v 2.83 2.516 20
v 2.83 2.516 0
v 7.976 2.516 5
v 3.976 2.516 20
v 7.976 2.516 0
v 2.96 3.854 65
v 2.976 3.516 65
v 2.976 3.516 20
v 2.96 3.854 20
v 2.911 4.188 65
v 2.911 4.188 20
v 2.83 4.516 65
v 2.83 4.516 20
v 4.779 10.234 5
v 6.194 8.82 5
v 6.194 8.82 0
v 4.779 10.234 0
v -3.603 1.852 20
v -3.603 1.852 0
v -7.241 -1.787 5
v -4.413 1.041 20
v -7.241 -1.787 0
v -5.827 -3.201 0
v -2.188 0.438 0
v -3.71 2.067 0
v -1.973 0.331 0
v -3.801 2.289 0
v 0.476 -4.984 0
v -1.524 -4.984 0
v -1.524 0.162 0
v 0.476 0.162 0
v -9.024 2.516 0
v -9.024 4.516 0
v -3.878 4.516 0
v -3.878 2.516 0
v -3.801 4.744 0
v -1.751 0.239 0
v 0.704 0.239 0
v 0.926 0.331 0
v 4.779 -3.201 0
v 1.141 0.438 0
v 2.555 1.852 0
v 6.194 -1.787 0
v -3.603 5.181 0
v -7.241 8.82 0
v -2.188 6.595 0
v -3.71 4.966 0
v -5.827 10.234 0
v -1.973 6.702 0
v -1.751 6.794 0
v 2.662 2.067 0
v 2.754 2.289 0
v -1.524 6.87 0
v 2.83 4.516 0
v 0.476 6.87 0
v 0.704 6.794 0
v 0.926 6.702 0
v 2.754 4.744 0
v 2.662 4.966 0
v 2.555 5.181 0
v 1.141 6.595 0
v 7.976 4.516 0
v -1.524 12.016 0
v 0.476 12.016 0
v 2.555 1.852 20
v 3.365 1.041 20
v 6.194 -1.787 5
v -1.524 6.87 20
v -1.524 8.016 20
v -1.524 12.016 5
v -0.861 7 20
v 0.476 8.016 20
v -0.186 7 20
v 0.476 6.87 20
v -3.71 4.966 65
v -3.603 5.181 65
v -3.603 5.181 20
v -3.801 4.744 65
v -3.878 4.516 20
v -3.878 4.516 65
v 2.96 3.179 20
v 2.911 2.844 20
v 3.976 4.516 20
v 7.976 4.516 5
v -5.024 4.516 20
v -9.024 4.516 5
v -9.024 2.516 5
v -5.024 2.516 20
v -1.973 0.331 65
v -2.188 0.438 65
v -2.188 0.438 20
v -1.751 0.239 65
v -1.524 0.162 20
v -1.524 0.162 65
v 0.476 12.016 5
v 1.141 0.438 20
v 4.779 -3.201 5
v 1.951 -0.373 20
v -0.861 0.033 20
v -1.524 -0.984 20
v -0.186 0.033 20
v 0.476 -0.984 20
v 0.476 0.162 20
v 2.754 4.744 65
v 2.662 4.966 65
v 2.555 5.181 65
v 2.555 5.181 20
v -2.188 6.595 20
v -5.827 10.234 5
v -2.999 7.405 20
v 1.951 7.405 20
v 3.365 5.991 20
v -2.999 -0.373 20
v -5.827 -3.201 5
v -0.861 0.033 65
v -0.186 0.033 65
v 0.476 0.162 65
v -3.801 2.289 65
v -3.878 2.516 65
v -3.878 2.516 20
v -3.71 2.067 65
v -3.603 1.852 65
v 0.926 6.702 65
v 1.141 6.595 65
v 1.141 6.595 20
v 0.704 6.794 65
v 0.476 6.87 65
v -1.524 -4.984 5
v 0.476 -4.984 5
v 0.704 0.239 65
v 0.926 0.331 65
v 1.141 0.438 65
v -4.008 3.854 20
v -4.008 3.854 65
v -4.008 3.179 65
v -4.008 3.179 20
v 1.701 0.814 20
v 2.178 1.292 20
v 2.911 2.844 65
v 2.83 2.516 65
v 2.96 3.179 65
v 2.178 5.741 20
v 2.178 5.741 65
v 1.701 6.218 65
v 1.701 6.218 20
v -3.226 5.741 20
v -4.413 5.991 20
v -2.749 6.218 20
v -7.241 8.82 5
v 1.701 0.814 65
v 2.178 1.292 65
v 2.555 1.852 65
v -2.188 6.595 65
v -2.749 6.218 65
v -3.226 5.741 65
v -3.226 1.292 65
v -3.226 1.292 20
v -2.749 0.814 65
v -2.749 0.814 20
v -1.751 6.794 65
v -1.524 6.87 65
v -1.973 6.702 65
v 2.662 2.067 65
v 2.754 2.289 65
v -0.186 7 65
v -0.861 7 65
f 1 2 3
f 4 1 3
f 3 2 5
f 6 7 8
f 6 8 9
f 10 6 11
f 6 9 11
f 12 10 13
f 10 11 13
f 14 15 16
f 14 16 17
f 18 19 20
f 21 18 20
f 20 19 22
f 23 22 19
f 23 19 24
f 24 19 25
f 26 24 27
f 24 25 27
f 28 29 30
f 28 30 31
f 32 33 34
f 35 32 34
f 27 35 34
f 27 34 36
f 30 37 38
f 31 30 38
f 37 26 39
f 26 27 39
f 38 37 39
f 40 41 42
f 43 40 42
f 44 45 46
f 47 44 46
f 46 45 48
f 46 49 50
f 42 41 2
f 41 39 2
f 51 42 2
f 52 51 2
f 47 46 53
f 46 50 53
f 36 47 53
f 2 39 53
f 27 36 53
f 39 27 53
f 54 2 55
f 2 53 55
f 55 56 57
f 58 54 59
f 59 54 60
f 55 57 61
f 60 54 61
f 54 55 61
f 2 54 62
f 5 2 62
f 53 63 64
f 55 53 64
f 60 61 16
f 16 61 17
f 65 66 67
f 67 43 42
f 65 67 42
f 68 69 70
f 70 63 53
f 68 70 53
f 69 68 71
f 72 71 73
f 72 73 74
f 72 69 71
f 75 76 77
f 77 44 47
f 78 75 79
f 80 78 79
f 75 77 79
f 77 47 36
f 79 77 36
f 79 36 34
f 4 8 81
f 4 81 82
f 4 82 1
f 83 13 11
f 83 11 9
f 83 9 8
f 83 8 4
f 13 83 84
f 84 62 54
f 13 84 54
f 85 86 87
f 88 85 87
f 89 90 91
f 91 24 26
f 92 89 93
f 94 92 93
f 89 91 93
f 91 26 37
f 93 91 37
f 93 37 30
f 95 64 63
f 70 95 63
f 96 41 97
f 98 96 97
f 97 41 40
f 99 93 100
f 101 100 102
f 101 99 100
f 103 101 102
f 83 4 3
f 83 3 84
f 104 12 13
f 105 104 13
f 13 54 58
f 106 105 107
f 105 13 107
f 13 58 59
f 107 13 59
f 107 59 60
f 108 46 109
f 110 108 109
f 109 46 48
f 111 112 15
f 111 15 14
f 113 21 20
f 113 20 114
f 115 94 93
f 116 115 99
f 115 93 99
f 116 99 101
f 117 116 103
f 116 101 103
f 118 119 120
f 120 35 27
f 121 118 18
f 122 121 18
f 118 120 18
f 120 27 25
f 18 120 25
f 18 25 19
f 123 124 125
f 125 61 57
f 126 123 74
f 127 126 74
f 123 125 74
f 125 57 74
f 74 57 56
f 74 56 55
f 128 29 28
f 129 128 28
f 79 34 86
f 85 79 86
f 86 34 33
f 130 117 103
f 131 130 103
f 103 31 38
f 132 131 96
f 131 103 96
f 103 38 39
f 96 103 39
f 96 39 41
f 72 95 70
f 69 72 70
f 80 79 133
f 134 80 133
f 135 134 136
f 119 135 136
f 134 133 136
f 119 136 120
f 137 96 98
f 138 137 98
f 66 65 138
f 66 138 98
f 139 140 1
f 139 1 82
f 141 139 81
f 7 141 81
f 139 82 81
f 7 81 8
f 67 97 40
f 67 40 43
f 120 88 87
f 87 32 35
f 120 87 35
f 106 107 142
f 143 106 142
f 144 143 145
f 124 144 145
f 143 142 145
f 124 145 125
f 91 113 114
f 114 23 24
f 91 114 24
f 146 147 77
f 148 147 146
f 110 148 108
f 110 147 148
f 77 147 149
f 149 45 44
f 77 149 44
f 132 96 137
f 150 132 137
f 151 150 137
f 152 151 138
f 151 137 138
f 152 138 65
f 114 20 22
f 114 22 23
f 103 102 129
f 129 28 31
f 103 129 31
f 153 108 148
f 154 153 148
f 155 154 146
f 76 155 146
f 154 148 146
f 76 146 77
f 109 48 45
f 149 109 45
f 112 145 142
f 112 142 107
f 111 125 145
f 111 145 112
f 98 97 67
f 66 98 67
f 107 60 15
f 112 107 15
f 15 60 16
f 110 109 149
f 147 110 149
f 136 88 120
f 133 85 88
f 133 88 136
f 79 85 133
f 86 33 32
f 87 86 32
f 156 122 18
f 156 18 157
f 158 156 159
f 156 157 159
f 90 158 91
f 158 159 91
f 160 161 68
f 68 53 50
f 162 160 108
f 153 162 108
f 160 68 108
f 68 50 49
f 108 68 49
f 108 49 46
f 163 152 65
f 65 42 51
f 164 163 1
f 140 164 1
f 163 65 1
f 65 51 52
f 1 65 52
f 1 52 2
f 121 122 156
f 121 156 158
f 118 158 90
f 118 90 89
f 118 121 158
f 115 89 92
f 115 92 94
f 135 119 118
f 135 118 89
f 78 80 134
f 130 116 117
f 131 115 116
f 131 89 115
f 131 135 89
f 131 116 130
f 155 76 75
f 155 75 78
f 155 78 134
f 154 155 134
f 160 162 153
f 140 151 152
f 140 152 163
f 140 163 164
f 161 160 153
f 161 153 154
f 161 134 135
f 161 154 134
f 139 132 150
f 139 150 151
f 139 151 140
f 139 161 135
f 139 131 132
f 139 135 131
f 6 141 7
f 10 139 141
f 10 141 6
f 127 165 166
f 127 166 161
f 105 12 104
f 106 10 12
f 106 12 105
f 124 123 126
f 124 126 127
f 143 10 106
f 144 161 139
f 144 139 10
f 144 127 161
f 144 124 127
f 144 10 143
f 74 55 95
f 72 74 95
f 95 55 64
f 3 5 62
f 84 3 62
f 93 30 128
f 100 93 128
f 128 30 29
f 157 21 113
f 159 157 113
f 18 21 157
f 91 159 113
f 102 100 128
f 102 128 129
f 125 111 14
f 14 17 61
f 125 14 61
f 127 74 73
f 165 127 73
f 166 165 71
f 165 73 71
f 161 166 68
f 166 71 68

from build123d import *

# Parameters (mm, degrees)
F1_DEPTH   = 65
F2_DEPTH   = 20
F3_SIZE2   = 15
F3_SIZE    = 4
F3_2_SIZE2 = 15
F3_2_SIZE  = 4
F3_3_SIZE2 = 15
F3_3_SIZE  = 4
F3_4_SIZE2 = 15
F3_4_SIZE  = 4
F4_SIZE2   = 4
F4_SIZE    = 15
F4_2_SIZE2 = 4
F4_2_SIZE  = 15
F4_3_SIZE2 = 4
F4_3_SIZE  = 15
F4_4_SIZE2 = 4
F4_4_SIZE  = 15


with BuildPart() as f1:
    # F0 (on Top) → F1 (new body)
    with BuildSketch(Plane.XY):
        with BuildLine():
            Line((0.4761658125, 5.9305784088), (1.1407672764, 6.5951798727))
            ThreePointArc((1.1407672764, 6.5951798727), (0.8155578257, 6.7499432102), (0.4761658125, 6.8704668126))
            Line((0.4761658125, 6.8704668126), (0.4761658125, 5.9305784088))
        make_face()
        with BuildLine():
            Line((-3.6026492139, 1.8517633824), (-2.9380477499, 2.5163648464))
            Line((-2.9380477499, 2.5163648464), (-3.8779361538, 2.5163648464))
            ThreePointArc((-3.8779361538, 2.5163648464), (-3.7574125513, 2.1769728331), (-3.6026492139, 1.8517633824))
        make_face()
        with BuildLine():
            ThreePointArc((2.8302677787, 4.5163648464), (2.7097441763, 4.8557568597), (2.5549808388, 5.1809663103))
            Line((2.5549808388, 5.1809663103), (1.8903793748, 4.5163648464))
            Line((1.8903793748, 4.5163648464), (2.8302677787, 4.5163648464))
        make_face()
        with BuildLine():
            Line((-1.5238341875, 0.1622628801), (-1.5238341875, 1.102151284))
            Line((-1.5238341875, 1.102151284), (-2.1884356515, 0.4375498201))
            ThreePointArc((-2.1884356515, 0.4375498201), (-1.8632262008, 0.2827864826), (-1.5238341875, 0.1622628801))
        make_face()
        with BuildLine():
            ThreePointArc((2.5549808388, 5.1809663103), (1.9510395466, 5.9912385805), (1.1407672764, 6.5951798727))
            Line((1.1407672764, 6.5951798727), (0.4761658125, 5.9305784088))
            Line((0.4761658125, 5.9305784088), (0.4761658125, 4.5163648464))
            Line((0.4761658125, 4.5163648464), (1.8903793748, 4.5163648464))
            Line((1.8903793748, 4.5163648464), (2.5549808388, 5.1809663103))
        make_face()
        Polygon((-0.9380477499, 4.5163648464), (-0.5238341875, 4.9305784088), (-1.5238341875, 5.9305784088), (-1.5238341875, 4.5163648464), align=None)
        with BuildLine():
            Line((-1.5238341875, 2.5163648464), (-2.9380477499, 2.5163648464))
            Line((-2.9380477499, 2.5163648464), (-3.6026492139, 1.8517633824))
            ThreePointArc((-3.6026492139, 1.8517633824), (-2.9987079217, 1.0414911122), (-2.1884356515, 0.4375498201))
            Line((-2.1884356515, 0.4375498201), (-1.5238341875, 1.102151284))
            Line((-1.5238341875, 1.102151284), (-1.5238341875, 2.5163648464))
        make_face()
        Polygon((1.8903793748, 2.5163648464), (0.8903793748, 3.5163648464), (0.4761658125, 3.102151284), (0.4761658125, 2.5163648464), align=None)
        Polygon((-0.1096206252, 4.5163648464), (-0.5238341875, 4.9305784088), (-0.9380477499, 4.5163648464), align=None)
        with BuildLine():
            Line((-1.5238341875, 4.5163648464), (-1.5238341875, 5.9305784088))
            Line((-1.5238341875, 5.9305784088), (-2.1884356515, 6.5951798727))
            ThreePointArc((-2.1884356515, 6.5951798727), (-2.9987079217, 5.9912385805), (-3.6026492139, 5.1809663103))
            Line((-3.6026492139, 5.1809663103), (-2.9380477499, 4.5163648464))
            Line((-2.9380477499, 4.5163648464), (-1.5238341875, 4.5163648464))
        make_face()
        Polygon((0.4761658125, 2.5163648464), (0.4761658125, 3.102151284), (-0.1096206252, 2.5163648464), align=None)
        with BuildLine():
            Line((-2.9380477499, 2.5163648464), (-1.9380477499, 3.5163648464))
            Line((-1.9380477499, 3.5163648464), (-2.9380477499, 4.5163648464))
            Line((-2.9380477499, 4.5163648464), (-3.8779361538, 4.5163648464))
            ThreePointArc((-3.8779361538, 4.5163648464), (-4.0238341875, 3.5163648464), (-3.8779361538, 2.5163648464))
            Line((-3.8779361538, 2.5163648464), (-2.9380477499, 2.5163648464))
        make_face()
        with BuildLine():
            Line((-0.5238341875, 4.9305784088), (0.4761658125, 5.9305784088))
            Line((0.4761658125, 5.9305784088), (0.4761658125, 6.8704668126))
            ThreePointArc((0.4761658125, 6.8704668126), (-0.5238341875, 7.0163648464), (-1.5238341875, 6.8704668126))
            Line((-1.5238341875, 6.8704668126), (-1.5238341875, 5.9305784088))
            Line((-1.5238341875, 5.9305784088), (-0.5238341875, 4.9305784088))
        make_face()
        with BuildLine():
            Line((2.8302677787, 4.5163648464), (1.8903793748, 4.5163648464))
            Line((1.8903793748, 4.5163648464), (0.8903793748, 3.5163648464))
            Line((0.8903793748, 3.5163648464), (1.8903793748, 2.5163648464))
            Line((1.8903793748, 2.5163648464), (2.8302677787, 2.5163648464))
            ThreePointArc((2.8302677787, 2.5163648464), (2.9394992415, 3.0110713089), (2.9761658125, 3.5163648464))
            ThreePointArc((2.9761658125, 3.5163648464), (2.9394992415, 4.0216583839), (2.8302677787, 4.5163648464))
        make_face()
        Polygon((-1.5238341875, 3.102151284), (-1.5238341875, 3.9305784088), (-1.9380477499, 3.5163648464), align=None)
        Polygon((0.4761658125, 4.5163648464), (0.4761658125, 5.9305784088), (-0.5238341875, 4.9305784088), (-0.1096206252, 4.5163648464), align=None)
        Polygon((-1.5238341875, 3.9305784088), (-0.9380477499, 4.5163648464), (-1.5238341875, 4.5163648464), align=None)
        with BuildLine():
            Line((2.5549808388, 1.8517633824), (1.8903793748, 2.5163648464))
            Line((1.8903793748, 2.5163648464), (0.4761658125, 2.5163648464))
            Line((0.4761658125, 2.5163648464), (0.4761658125, 1.102151284))
            Line((0.4761658125, 1.102151284), (1.1407672764, 0.4375498201))
            ThreePointArc((1.1407672764, 0.4375498201), (1.9510395466, 1.0414911122), (2.5549808388, 1.8517633824))
        make_face()
        Polygon((0.8903793748, 3.5163648464), (0.4761658125, 3.9305784088), (0.4761658125, 3.102151284), align=None)
        Polygon((-0.1096206252, 4.5163648464), (-0.9380477499, 4.5163648464), (-1.5238341875, 3.9305784088), (-1.5238341875, 3.102151284), (-0.9380477499, 2.5163648464), (-0.1096206252, 2.5163648464), (0.4761658125, 3.102151284), (0.4761658125, 3.9305784088), align=None)
        with BuildLine():
            Line((2.8302677787, 2.5163648464), (1.8903793748, 2.5163648464))
            Line((1.8903793748, 2.5163648464), (2.5549808388, 1.8517633824))
            ThreePointArc((2.5549808388, 1.8517633824), (2.7097441763, 2.1769728331), (2.8302677787, 2.5163648464))
        make_face()
        Polygon((0.4761658125, 3.9305784088), (0.4761658125, 4.5163648464), (-0.1096206252, 4.5163648464), align=None)
        Polygon((-1.9380477499, 3.5163648464), (-1.5238341875, 3.9305784088), (-1.5238341875, 4.5163648464), (-2.9380477499, 4.5163648464), align=None)
        with BuildLine():
            Line((0.4761658125, 1.102151284), (-0.5238341875, 2.102151284))
            Line((-0.5238341875, 2.102151284), (-1.5238341875, 1.102151284))
            Line((-1.5238341875, 1.102151284), (-1.5238341875, 0.1622628801))
            ThreePointArc((-1.5238341875, 0.1622628801), (-0.5238341875, 0.0163648464), (0.4761658125, 0.1622628801))
            Line((0.4761658125, 0.1622628801), (0.4761658125, 1.102151284))
        make_face()
        with BuildLine():
            Line((-1.5238341875, 5.9305784088), (-1.5238341875, 6.8704668126))
            ThreePointArc((-1.5238341875, 6.8704668126), (-1.8632262008, 6.7499432102), (-2.1884356515, 6.5951798727))
            Line((-2.1884356515, 6.5951798727), (-1.5238341875, 5.9305784088))
        make_face()
        Polygon((-1.5238341875, 3.102151284), (-1.9380477499, 3.5163648464), (-2.9380477499, 2.5163648464), (-1.5238341875, 2.5163648464), align=None)
        with BuildLine():
            Line((-2.9380477499, 4.5163648464), (-3.6026492139, 5.1809663103))
            ThreePointArc((-3.6026492139, 5.1809663103), (-3.7574125513, 4.8557568597), (-3.8779361538, 4.5163648464))
            Line((-3.8779361538, 4.5163648464), (-2.9380477499, 4.5163648464))
        make_face()
        Polygon((-0.9380477499, 2.5163648464), (-1.5238341875, 3.102151284), (-1.5238341875, 2.5163648464), align=None)
        Polygon((-0.5238341875, 2.102151284), (-0.9380477499, 2.5163648464), (-1.5238341875, 2.5163648464), (-1.5238341875, 1.102151284), align=None)
        Polygon((-0.5238341875, 2.102151284), (-0.1096206252, 2.5163648464), (-0.9380477499, 2.5163648464), align=None)
        Polygon((0.4761658125, 2.5163648464), (-0.1096206252, 2.5163648464), (-0.5238341875, 2.102151284), (0.4761658125, 1.102151284), align=None)
        Polygon((1.8903793748, 4.5163648464), (0.4761658125, 4.5163648464), (0.4761658125, 3.9305784088), (0.8903793748, 3.5163648464), align=None)
        with BuildLine():
            Line((1.1407672764, 0.4375498201), (0.4761658125, 1.102151284))
            Line((0.4761658125, 1.102151284), (0.4761658125, 0.1622628801))
            ThreePointArc((0.4761658125, 0.1622628801), (0.8155578257, 0.2827864826), (1.1407672764, 0.4375498201))
        make_face()
    extrude(amount=F1_DEPTH)

    # F0 (on Top) → F2 (join)
    with BuildSketch(Plane.XY):
        with BuildLine():
            Line((6.1936802337, 8.8196657053), (4.7794666714, 10.2338792677))
            Line((4.7794666714, 10.2338792677), (1.1407672764, 6.5951798727))
            ThreePointArc((1.1407672764, 6.5951798727), (1.9510395466, 5.9912385805), (2.5549808388, 5.1809663103))
            Line((2.5549808388, 5.1809663103), (6.1936802337, 8.8196657053))
        make_face()
        with BuildLine():
            ThreePointArc((-3.6026492139, 5.1809663103), (-2.9987079217, 5.9912385805), (-2.1884356515, 6.5951798727))
            Line((-2.1884356515, 6.5951798727), (-5.8271350464, 10.2338792677))
            Line((-5.8271350464, 10.2338792677), (-7.2413486088, 8.8196657053))
            Line((-7.2413486088, 8.8196657053), (-3.6026492139, 5.1809663103))
        make_face()
        with BuildLine():
            ThreePointArc((-2.1884356515, 0.4375498201), (-2.9987079217, 1.0414911122), (-3.6026492139, 1.8517633824))
            Line((-3.6026492139, 1.8517633824), (-7.2413486088, -1.7869360125))
            Line((-7.2413486088, -1.7869360125), (-5.8271350464, -3.2011495749))
            Line((-5.8271350464, -3.2011495749), (-2.1884356515, 0.4375498201))
        make_face()
        with BuildLine():
            ThreePointArc((-3.8779361538, 2.5163648464), (-4.0238341875, 3.5163648464), (-3.8779361538, 4.5163648464))
            Line((-3.8779361538, 4.5163648464), (-9.0238341875, 4.5163648464))
            Line((-9.0238341875, 4.5163648464), (-9.0238341875, 2.5163648464))
            Line((-9.0238341875, 2.5163648464), (-3.8779361538, 2.5163648464))
        make_face()
        with BuildLine():
            Line((0.4761658125, -4.9836351536), (0.4761658125, 0.1622628801))
            ThreePointArc((0.4761658125, 0.1622628801), (-0.5238341875, 0.0163648464), (-1.5238341875, 0.1622628801))
            Line((-1.5238341875, 0.1622628801), (-1.5238341875, -4.9836351536))
            Line((-1.5238341875, -4.9836351536), (0.4761658125, -4.9836351536))
        make_face()
        with BuildLine():
            Line((7.9761658125, 4.5163648464), (2.8302677787, 4.5163648464))
            ThreePointArc((2.8302677787, 4.5163648464), (2.9394992415, 4.0216583839), (2.9761658125, 3.5163648464))
            ThreePointArc((2.9761658125, 3.5163648464), (2.9394992415, 3.0110713089), (2.8302677787, 2.5163648464))
            Line((2.8302677787, 2.5163648464), (7.9761658125, 2.5163648464))
            Line((7.9761658125, 2.5163648464), (7.9761658125, 4.5163648464))
        make_face()
        with BuildLine():
            Line((6.1936802337, -1.7869360125), (2.5549808388, 1.8517633824))
            ThreePointArc((2.5549808388, 1.8517633824), (1.9510395466, 1.0414911122), (1.1407672764, 0.4375498201))
            Line((1.1407672764, 0.4375498201), (4.7794666714, -3.2011495749))
            Line((4.7794666714, -3.2011495749), (6.1936802337, -1.7869360125))
        make_face()
        with BuildLine():
            ThreePointArc((-1.5238341875, 6.8704668126), (-0.5238341875, 7.0163648464), (0.4761658125, 6.8704668126))
            Line((0.4761658125, 6.8704668126), (0.4761658125, 12.0163648464))
            Line((0.4761658125, 12.0163648464), (-1.5238341875, 12.0163648464))
            Line((-1.5238341875, 12.0163648464), (-1.5238341875, 6.8704668126))
        make_face()
    extrude(amount=F2_DEPTH)

    # F3
    f3_edges = [f1.edges().sort_by_distance(p)[0] for p in [
        (-6.534242, 9.526772, 20),
    ]]
    f3_side = f1.faces().sort_by_distance((-4.749295, 7.741826, 20))[0]
    chamfer(f3_edges, length=F3_SIZE, length2=F3_SIZE2, reference=f3_side)

    # F3#2
    f3_2_edges = [f1.edges().sort_by_distance(p)[0] for p in [
        (-6.534242, -2.494043, 20),
    ]]
    f3_2_side = f1.faces().sort_by_distance((-4.749295, -0.709096, 20))[0]
    chamfer(f3_2_edges, length=F3_2_SIZE, length2=F3_2_SIZE2, reference=f3_2_side)

    # F3#3
    f3_3_edges = [f1.edges().sort_by_distance(p)[0] for p in [
        (-0.523834, 12.016365, 20),
    ]]
    f3_3_side = f1.faces().sort_by_distance((-0.523834, 9.492069, 20))[0]
    chamfer(f3_3_edges, length=F3_3_SIZE, length2=F3_3_SIZE2, reference=f3_3_side)

    # F3#4
    f3_4_edges = [f1.edges().sort_by_distance(p)[0] for p in [
        (-9.023834, 3.516365, 20),
    ]]
    f3_4_side = f1.faces().sort_by_distance((-6.499538, 3.516365, 20))[0]
    chamfer(f3_4_edges, length=F3_4_SIZE, length2=F3_4_SIZE2, reference=f3_4_side)

    # F4
    f4_edges = [f1.edges().sort_by_distance(p)[0] for p in [
        (5.486573, -2.494043, 20),
    ]]
    f4_side = f1.faces().sort_by_distance((5.486573, -2.494043, 10))[0]
    chamfer(f4_edges, length=F4_SIZE, length2=F4_SIZE2, reference=f4_side)

    # F4#2
    f4_2_edges = [f1.edges().sort_by_distance(p)[0] for p in [
        (5.486573, 9.526772, 20),
    ]]
    f4_2_side = f1.faces().sort_by_distance((5.486573, 9.526772, 10))[0]
    chamfer(f4_2_edges, length=F4_2_SIZE, length2=F4_2_SIZE2, reference=f4_2_side)

    # F4#3
    f4_3_edges = [f1.edges().sort_by_distance(p)[0] for p in [
        (-0.523834, -4.983635, 20),
    ]]
    f4_3_side = f1.faces().sort_by_distance((-0.523834, -4.983635, 10))[0]
    chamfer(f4_3_edges, length=F4_3_SIZE, length2=F4_3_SIZE2, reference=f4_3_side)

    # F4#4
    f4_4_edges = [f1.edges().sort_by_distance(p)[0] for p in [
        (7.976166, 3.516365, 20),
    ]]
    f4_4_side = f1.faces().sort_by_distance((7.976166, 3.516365, 10))[0]
    chamfer(f4_4_edges, length=F4_4_SIZE, length2=F4_4_SIZE2, reference=f4_4_side)


solid = f1.part
